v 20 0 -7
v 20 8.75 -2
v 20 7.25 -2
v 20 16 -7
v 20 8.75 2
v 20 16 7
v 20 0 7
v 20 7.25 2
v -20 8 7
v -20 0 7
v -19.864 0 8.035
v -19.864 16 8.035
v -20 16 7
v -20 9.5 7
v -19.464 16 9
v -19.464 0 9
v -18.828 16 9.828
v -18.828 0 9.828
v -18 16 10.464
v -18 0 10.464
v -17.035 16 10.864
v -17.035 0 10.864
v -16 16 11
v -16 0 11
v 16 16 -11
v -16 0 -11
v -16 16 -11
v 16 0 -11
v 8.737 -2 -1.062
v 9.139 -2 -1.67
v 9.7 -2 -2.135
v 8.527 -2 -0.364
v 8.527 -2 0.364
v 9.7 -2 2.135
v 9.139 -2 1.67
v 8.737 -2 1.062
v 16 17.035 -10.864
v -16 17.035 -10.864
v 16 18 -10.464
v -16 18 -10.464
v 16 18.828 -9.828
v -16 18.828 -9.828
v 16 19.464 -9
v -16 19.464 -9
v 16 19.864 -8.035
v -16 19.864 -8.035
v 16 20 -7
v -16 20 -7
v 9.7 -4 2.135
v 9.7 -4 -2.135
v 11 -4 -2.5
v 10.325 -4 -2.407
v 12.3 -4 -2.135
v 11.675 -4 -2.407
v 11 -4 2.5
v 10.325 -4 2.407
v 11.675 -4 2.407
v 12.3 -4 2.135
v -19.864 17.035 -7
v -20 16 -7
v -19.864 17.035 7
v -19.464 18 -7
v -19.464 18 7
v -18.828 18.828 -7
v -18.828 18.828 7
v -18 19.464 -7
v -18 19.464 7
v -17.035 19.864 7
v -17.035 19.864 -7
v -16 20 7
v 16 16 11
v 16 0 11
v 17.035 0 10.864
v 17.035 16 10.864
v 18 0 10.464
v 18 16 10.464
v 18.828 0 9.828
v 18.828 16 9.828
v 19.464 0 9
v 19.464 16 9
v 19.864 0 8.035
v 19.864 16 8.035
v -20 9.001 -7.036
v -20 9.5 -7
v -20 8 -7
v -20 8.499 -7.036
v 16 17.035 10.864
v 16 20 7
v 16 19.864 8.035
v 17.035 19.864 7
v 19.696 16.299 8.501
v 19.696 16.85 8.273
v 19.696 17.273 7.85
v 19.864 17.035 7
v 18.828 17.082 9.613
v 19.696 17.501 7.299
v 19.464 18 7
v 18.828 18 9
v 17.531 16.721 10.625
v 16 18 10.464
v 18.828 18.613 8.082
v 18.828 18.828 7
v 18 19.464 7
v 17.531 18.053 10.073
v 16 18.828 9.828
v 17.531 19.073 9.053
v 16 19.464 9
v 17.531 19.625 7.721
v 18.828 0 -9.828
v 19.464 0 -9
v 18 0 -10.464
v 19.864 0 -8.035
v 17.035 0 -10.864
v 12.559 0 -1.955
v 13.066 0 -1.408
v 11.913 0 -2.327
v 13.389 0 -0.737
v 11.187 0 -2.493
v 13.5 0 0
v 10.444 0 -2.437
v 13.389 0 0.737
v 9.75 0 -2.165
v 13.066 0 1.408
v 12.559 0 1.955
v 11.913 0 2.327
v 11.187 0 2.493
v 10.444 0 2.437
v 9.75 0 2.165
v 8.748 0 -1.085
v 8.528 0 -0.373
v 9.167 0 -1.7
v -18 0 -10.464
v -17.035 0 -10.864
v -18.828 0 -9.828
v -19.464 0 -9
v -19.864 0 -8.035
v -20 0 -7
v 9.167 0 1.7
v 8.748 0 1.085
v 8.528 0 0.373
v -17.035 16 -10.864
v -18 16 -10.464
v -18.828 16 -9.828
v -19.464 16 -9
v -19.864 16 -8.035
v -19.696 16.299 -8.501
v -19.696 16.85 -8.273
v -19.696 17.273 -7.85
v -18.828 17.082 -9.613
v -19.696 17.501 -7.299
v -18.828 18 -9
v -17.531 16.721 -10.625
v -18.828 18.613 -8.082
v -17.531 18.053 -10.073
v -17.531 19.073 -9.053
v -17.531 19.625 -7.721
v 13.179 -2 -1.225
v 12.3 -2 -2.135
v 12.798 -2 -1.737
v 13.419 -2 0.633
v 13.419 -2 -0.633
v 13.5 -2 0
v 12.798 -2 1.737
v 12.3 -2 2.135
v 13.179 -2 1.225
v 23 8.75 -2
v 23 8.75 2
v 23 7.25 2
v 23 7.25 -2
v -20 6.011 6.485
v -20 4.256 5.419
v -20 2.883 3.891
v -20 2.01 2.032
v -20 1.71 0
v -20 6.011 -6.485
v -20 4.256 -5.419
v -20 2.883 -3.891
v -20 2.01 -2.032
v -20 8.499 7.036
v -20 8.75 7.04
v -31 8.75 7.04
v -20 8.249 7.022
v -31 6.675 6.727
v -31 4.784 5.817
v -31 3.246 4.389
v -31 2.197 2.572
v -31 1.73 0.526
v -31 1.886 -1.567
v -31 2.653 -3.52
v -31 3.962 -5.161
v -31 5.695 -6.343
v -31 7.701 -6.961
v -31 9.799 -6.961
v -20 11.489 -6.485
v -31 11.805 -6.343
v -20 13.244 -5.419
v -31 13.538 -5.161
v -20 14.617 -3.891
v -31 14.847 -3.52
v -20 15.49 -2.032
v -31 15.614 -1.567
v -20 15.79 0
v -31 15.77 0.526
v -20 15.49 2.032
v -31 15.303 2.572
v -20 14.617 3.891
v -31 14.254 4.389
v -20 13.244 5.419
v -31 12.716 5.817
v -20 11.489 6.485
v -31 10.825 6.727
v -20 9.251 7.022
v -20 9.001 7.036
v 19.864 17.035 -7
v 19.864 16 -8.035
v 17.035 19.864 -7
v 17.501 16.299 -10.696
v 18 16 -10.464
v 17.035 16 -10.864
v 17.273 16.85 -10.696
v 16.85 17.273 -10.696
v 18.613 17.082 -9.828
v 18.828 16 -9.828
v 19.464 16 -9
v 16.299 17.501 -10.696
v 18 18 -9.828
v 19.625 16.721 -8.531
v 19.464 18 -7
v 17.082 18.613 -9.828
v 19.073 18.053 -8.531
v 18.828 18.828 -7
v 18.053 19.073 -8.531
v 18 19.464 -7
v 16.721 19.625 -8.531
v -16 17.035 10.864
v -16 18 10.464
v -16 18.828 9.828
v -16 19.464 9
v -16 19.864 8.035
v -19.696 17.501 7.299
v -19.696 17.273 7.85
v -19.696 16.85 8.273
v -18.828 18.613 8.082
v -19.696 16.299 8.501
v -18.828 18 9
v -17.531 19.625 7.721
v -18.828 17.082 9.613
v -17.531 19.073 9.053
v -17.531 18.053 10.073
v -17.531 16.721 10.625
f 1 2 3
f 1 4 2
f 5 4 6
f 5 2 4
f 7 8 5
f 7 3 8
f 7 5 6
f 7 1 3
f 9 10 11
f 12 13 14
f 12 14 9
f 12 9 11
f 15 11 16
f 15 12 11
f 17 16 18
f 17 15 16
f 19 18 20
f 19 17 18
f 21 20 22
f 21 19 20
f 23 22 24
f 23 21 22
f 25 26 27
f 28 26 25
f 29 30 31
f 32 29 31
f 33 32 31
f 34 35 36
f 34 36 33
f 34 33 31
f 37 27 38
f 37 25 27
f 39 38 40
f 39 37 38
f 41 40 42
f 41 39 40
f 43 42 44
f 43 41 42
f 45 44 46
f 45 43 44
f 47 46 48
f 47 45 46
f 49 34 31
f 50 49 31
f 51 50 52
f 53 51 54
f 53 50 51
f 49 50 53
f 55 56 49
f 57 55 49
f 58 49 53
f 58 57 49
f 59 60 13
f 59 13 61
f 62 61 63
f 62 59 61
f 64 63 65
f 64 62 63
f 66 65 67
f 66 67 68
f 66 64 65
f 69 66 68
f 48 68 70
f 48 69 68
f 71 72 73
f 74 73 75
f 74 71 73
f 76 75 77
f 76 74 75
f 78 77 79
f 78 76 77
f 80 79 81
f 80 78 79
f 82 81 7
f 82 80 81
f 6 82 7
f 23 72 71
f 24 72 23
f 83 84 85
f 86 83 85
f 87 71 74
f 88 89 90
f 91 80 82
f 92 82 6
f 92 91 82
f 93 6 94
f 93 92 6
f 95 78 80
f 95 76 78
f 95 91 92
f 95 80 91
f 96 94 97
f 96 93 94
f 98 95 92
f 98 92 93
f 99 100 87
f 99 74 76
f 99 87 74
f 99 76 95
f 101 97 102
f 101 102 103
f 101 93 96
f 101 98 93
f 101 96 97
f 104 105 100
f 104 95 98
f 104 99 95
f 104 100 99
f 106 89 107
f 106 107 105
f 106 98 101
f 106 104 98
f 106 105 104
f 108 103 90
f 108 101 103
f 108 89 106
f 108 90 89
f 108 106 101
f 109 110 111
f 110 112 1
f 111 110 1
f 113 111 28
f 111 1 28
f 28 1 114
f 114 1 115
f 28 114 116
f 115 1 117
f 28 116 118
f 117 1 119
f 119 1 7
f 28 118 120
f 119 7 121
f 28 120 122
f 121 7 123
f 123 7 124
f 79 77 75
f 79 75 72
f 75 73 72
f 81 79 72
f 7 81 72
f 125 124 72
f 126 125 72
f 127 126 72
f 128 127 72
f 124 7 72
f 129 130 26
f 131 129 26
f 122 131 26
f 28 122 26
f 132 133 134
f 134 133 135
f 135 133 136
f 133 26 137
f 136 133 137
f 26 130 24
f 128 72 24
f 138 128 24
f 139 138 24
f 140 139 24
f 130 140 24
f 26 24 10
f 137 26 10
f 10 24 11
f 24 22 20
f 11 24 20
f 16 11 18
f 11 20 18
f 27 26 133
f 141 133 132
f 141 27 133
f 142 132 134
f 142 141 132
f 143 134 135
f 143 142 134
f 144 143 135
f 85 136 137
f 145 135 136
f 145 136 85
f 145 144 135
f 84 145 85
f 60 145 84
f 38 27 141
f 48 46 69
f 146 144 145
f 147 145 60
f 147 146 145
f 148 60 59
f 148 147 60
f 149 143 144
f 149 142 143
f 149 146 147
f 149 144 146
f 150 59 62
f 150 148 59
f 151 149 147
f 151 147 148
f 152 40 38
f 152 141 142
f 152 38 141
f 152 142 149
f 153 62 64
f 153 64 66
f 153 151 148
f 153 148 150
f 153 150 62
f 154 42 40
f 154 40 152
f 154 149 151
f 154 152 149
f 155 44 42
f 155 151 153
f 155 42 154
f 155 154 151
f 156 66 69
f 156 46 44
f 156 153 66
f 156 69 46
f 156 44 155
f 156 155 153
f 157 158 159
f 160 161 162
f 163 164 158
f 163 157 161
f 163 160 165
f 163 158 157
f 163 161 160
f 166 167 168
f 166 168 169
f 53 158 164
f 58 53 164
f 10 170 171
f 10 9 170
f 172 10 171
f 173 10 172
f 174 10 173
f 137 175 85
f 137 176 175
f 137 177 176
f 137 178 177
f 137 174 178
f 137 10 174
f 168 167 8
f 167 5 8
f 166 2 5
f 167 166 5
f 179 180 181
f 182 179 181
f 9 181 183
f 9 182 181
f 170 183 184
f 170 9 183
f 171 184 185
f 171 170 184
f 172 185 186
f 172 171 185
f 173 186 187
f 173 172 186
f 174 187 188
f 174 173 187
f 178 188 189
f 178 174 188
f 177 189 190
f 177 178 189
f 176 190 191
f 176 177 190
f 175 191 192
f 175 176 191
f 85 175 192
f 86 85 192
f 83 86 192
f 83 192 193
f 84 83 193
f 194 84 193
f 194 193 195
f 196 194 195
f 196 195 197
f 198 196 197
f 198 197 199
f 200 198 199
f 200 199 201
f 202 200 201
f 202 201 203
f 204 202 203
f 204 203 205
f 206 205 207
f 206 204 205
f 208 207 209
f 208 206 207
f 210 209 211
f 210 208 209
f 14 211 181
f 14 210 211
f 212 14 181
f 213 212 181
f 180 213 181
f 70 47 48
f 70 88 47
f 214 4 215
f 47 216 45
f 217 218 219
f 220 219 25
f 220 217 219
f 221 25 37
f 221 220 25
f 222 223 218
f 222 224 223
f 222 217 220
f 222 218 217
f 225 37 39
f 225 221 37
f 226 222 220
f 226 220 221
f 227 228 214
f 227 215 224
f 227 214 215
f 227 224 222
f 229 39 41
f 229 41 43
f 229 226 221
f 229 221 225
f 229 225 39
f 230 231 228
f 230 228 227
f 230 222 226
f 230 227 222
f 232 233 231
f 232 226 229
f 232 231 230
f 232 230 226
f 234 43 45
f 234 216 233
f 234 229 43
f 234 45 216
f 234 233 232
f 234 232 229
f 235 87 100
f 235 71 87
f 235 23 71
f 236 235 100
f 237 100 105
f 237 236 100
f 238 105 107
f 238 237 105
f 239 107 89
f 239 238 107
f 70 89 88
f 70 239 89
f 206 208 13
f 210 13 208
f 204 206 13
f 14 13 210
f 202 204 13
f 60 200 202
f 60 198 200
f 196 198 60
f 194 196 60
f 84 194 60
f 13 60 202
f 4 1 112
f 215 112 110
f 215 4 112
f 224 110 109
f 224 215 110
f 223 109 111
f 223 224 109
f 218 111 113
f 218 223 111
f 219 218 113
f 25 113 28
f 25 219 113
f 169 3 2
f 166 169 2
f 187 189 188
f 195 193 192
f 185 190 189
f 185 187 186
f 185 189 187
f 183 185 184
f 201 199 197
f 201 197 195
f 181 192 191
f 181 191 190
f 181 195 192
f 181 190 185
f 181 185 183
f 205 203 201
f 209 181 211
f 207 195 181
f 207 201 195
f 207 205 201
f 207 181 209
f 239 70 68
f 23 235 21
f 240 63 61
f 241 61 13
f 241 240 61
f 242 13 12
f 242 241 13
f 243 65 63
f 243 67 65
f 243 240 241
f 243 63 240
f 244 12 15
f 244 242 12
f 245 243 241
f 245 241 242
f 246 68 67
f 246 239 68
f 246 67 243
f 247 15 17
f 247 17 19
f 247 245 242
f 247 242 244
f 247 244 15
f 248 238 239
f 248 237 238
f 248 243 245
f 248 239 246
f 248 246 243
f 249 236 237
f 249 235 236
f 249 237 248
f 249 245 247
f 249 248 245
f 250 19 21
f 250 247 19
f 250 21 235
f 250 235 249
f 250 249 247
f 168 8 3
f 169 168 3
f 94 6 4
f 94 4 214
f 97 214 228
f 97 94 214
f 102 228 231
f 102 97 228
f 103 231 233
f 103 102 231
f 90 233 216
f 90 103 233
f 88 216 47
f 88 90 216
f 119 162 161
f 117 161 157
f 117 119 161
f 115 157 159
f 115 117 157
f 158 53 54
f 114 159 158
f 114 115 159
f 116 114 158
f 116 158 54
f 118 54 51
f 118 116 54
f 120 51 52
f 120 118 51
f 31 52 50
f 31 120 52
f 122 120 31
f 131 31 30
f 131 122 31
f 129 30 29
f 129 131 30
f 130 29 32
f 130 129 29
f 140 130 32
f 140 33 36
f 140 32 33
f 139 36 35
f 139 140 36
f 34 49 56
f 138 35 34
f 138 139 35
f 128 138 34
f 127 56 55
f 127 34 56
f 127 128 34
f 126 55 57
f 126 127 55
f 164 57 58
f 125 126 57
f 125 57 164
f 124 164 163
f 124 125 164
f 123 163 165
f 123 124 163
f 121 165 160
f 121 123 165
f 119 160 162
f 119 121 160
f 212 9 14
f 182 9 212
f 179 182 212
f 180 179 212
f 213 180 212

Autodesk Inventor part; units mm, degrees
ref_plane "YZ Plane" through (0, 0, 0) normal (1, 0, 0) x (0, 1, 0)
ref_plane "XZ Plane" through (0, 0, 0) normal (0, 1, 0) x (-1, 0, 0)
ref_plane "XY Plane" through (0, 0, 0) normal (0, 0, 1) x (1, 0, 0)
sketch "Sketch1" plane through (0, 0, 0) normal (0, 1, 0) x (-1, 0, 0)
  line L0 (-20, 11) -> (20, 11)
  line L1 (20, 11) -> (20, -11)
  line L2 (20, -11) -> (-20, -11)
  line L3 (-20, -11) -> (-20, 11)
  line L4 (-20, 11) -> (20, -11) construction
  line L5 (20, 11) -> (-20, -11) construction
  point P0 (0, 0)
  dimension "d0" = 40
  dimension "d1" = 22
extrude "Extrusion1" add sketch "Sketch1" along normal blind 20
fillet "Fillet1" radius 4 8 edges at (0, 20, 11) (20, 20, 0) (20, 10, 11) (20, 10, -11) (0, 20, -11) (-20, 10, -11) (-20, 20, 0) (-20, 10, 11)
sketch "Sketch2" plane through (20, 0, 7) normal (1, 0, 0) x (0, 0, -1)
  line L0 (14, 0) -> (0, 0) construction
  line L1 (14, 16) -> (18, 16) construction
  line L2 (0, 0) -> (14, 16) construction
  line L3 (14, 16) -> (0, 16) construction
  line L4 (0, 16) -> (14, 0) construction
  line L5 (9, 8.75) -> (5, 8.75)
  line L6 (5, 8.75) -> (5, 7.25)
  line L7 (5, 7.25) -> (9, 7.25)
  line L8 (9, 7.25) -> (9, 8.75)
  line L9 (9, 8.75) -> (5, 7.25) construction
  line L10 (5, 8.75) -> (9, 7.25) construction
  point P0 (7, 0)
  point P1 (7, 8)
  dimension "d5" = 4
  dimension "d6" = 1.5
extrude "Extrusion2" add sketch "Sketch2" along normal blind 3
sketch "Sketch3" plane through (0, 0, 0) normal (0, -1, 0) x (1, 0, 0)
  arc A0 (20, 7) -> (16, 11) centre (16, 7) ccw projected
  arc A1 (-20, -7) -> (-16, -11) centre (-16, -7) ccw projected
  line L0 (16, 7) -> (-16, -7) construction
  line L1 (-16, 7) -> (-16, 11) projected
  line L2 (-16, -7) -> (-16, 7) construction
  line L3 (20, -7) -> (16, -7) projected
  line L4 (-16, 7) -> (16, -7) construction
  line L5 (16, -7) -> (16, 7) construction
  line L6 (16, 7) -> (11, 7) construction
  line L7 (16, 7) -> (-16, 7) construction
  line L8 (11, 7) -> (11, -7) construction
  circle A2 centre (11, 0) radius 2.5
  point P0 (0, 0)
  dimension "d9" = 5
  dimension "d10" = 5
extrude "Extrusion3" add sketch "Sketch3" along normal blind 2
sketch "Sketch4" plane through (11, -2, 0) normal (0, -1, 0) x (1, 0, 0)
  line L0 (-1.3, -4.4849) -> (1.3, -4.4849)
  line L1 (1.3, -2.1354) -> (1.3, 2.1354)
  line L2 (-1.3, 2.1354) -> (-1.3, -2.1354)
  line L3 (-1.3, -4.4849) -> (1.3, 4.4849) construction
  line L4 (1.3, -4.4849) -> (-1.3, 4.4849) construction
  circle A0 centre (0, 0) radius 2.5 projected
  arc A1 (1.3, 2.1354) -> (-1.3, 2.1354) centre (0, 0) ccw
  arc A2 (-1.3, -2.1354) -> (1.3, -2.1354) centre (0, 0) ccw
  point P0 (-11, 0)
  dimension "d13" = 2.6
extrude "Extrusion4" add sketch "Sketch4" along normal blind 2 contours A0 L2 L1
sketch "Sketch5" plane through (-20, 0, -7) normal (-1, 0, 0) x (0, 0, 1)
  line L0 (5, 8.75) -> (9, 8.75) projected
  circle A0 centre (7, 8.75) radius 7.0401
  point P0 (7, 0)
extrude "Extrusion5" add sketch "Sketch5" along normal blind 11
ref_plane "Work Plane1" through (-16, 0, 0) normal (0, 0, 1) x (1, 0, 0)
properties part number "Lifting Motor"
